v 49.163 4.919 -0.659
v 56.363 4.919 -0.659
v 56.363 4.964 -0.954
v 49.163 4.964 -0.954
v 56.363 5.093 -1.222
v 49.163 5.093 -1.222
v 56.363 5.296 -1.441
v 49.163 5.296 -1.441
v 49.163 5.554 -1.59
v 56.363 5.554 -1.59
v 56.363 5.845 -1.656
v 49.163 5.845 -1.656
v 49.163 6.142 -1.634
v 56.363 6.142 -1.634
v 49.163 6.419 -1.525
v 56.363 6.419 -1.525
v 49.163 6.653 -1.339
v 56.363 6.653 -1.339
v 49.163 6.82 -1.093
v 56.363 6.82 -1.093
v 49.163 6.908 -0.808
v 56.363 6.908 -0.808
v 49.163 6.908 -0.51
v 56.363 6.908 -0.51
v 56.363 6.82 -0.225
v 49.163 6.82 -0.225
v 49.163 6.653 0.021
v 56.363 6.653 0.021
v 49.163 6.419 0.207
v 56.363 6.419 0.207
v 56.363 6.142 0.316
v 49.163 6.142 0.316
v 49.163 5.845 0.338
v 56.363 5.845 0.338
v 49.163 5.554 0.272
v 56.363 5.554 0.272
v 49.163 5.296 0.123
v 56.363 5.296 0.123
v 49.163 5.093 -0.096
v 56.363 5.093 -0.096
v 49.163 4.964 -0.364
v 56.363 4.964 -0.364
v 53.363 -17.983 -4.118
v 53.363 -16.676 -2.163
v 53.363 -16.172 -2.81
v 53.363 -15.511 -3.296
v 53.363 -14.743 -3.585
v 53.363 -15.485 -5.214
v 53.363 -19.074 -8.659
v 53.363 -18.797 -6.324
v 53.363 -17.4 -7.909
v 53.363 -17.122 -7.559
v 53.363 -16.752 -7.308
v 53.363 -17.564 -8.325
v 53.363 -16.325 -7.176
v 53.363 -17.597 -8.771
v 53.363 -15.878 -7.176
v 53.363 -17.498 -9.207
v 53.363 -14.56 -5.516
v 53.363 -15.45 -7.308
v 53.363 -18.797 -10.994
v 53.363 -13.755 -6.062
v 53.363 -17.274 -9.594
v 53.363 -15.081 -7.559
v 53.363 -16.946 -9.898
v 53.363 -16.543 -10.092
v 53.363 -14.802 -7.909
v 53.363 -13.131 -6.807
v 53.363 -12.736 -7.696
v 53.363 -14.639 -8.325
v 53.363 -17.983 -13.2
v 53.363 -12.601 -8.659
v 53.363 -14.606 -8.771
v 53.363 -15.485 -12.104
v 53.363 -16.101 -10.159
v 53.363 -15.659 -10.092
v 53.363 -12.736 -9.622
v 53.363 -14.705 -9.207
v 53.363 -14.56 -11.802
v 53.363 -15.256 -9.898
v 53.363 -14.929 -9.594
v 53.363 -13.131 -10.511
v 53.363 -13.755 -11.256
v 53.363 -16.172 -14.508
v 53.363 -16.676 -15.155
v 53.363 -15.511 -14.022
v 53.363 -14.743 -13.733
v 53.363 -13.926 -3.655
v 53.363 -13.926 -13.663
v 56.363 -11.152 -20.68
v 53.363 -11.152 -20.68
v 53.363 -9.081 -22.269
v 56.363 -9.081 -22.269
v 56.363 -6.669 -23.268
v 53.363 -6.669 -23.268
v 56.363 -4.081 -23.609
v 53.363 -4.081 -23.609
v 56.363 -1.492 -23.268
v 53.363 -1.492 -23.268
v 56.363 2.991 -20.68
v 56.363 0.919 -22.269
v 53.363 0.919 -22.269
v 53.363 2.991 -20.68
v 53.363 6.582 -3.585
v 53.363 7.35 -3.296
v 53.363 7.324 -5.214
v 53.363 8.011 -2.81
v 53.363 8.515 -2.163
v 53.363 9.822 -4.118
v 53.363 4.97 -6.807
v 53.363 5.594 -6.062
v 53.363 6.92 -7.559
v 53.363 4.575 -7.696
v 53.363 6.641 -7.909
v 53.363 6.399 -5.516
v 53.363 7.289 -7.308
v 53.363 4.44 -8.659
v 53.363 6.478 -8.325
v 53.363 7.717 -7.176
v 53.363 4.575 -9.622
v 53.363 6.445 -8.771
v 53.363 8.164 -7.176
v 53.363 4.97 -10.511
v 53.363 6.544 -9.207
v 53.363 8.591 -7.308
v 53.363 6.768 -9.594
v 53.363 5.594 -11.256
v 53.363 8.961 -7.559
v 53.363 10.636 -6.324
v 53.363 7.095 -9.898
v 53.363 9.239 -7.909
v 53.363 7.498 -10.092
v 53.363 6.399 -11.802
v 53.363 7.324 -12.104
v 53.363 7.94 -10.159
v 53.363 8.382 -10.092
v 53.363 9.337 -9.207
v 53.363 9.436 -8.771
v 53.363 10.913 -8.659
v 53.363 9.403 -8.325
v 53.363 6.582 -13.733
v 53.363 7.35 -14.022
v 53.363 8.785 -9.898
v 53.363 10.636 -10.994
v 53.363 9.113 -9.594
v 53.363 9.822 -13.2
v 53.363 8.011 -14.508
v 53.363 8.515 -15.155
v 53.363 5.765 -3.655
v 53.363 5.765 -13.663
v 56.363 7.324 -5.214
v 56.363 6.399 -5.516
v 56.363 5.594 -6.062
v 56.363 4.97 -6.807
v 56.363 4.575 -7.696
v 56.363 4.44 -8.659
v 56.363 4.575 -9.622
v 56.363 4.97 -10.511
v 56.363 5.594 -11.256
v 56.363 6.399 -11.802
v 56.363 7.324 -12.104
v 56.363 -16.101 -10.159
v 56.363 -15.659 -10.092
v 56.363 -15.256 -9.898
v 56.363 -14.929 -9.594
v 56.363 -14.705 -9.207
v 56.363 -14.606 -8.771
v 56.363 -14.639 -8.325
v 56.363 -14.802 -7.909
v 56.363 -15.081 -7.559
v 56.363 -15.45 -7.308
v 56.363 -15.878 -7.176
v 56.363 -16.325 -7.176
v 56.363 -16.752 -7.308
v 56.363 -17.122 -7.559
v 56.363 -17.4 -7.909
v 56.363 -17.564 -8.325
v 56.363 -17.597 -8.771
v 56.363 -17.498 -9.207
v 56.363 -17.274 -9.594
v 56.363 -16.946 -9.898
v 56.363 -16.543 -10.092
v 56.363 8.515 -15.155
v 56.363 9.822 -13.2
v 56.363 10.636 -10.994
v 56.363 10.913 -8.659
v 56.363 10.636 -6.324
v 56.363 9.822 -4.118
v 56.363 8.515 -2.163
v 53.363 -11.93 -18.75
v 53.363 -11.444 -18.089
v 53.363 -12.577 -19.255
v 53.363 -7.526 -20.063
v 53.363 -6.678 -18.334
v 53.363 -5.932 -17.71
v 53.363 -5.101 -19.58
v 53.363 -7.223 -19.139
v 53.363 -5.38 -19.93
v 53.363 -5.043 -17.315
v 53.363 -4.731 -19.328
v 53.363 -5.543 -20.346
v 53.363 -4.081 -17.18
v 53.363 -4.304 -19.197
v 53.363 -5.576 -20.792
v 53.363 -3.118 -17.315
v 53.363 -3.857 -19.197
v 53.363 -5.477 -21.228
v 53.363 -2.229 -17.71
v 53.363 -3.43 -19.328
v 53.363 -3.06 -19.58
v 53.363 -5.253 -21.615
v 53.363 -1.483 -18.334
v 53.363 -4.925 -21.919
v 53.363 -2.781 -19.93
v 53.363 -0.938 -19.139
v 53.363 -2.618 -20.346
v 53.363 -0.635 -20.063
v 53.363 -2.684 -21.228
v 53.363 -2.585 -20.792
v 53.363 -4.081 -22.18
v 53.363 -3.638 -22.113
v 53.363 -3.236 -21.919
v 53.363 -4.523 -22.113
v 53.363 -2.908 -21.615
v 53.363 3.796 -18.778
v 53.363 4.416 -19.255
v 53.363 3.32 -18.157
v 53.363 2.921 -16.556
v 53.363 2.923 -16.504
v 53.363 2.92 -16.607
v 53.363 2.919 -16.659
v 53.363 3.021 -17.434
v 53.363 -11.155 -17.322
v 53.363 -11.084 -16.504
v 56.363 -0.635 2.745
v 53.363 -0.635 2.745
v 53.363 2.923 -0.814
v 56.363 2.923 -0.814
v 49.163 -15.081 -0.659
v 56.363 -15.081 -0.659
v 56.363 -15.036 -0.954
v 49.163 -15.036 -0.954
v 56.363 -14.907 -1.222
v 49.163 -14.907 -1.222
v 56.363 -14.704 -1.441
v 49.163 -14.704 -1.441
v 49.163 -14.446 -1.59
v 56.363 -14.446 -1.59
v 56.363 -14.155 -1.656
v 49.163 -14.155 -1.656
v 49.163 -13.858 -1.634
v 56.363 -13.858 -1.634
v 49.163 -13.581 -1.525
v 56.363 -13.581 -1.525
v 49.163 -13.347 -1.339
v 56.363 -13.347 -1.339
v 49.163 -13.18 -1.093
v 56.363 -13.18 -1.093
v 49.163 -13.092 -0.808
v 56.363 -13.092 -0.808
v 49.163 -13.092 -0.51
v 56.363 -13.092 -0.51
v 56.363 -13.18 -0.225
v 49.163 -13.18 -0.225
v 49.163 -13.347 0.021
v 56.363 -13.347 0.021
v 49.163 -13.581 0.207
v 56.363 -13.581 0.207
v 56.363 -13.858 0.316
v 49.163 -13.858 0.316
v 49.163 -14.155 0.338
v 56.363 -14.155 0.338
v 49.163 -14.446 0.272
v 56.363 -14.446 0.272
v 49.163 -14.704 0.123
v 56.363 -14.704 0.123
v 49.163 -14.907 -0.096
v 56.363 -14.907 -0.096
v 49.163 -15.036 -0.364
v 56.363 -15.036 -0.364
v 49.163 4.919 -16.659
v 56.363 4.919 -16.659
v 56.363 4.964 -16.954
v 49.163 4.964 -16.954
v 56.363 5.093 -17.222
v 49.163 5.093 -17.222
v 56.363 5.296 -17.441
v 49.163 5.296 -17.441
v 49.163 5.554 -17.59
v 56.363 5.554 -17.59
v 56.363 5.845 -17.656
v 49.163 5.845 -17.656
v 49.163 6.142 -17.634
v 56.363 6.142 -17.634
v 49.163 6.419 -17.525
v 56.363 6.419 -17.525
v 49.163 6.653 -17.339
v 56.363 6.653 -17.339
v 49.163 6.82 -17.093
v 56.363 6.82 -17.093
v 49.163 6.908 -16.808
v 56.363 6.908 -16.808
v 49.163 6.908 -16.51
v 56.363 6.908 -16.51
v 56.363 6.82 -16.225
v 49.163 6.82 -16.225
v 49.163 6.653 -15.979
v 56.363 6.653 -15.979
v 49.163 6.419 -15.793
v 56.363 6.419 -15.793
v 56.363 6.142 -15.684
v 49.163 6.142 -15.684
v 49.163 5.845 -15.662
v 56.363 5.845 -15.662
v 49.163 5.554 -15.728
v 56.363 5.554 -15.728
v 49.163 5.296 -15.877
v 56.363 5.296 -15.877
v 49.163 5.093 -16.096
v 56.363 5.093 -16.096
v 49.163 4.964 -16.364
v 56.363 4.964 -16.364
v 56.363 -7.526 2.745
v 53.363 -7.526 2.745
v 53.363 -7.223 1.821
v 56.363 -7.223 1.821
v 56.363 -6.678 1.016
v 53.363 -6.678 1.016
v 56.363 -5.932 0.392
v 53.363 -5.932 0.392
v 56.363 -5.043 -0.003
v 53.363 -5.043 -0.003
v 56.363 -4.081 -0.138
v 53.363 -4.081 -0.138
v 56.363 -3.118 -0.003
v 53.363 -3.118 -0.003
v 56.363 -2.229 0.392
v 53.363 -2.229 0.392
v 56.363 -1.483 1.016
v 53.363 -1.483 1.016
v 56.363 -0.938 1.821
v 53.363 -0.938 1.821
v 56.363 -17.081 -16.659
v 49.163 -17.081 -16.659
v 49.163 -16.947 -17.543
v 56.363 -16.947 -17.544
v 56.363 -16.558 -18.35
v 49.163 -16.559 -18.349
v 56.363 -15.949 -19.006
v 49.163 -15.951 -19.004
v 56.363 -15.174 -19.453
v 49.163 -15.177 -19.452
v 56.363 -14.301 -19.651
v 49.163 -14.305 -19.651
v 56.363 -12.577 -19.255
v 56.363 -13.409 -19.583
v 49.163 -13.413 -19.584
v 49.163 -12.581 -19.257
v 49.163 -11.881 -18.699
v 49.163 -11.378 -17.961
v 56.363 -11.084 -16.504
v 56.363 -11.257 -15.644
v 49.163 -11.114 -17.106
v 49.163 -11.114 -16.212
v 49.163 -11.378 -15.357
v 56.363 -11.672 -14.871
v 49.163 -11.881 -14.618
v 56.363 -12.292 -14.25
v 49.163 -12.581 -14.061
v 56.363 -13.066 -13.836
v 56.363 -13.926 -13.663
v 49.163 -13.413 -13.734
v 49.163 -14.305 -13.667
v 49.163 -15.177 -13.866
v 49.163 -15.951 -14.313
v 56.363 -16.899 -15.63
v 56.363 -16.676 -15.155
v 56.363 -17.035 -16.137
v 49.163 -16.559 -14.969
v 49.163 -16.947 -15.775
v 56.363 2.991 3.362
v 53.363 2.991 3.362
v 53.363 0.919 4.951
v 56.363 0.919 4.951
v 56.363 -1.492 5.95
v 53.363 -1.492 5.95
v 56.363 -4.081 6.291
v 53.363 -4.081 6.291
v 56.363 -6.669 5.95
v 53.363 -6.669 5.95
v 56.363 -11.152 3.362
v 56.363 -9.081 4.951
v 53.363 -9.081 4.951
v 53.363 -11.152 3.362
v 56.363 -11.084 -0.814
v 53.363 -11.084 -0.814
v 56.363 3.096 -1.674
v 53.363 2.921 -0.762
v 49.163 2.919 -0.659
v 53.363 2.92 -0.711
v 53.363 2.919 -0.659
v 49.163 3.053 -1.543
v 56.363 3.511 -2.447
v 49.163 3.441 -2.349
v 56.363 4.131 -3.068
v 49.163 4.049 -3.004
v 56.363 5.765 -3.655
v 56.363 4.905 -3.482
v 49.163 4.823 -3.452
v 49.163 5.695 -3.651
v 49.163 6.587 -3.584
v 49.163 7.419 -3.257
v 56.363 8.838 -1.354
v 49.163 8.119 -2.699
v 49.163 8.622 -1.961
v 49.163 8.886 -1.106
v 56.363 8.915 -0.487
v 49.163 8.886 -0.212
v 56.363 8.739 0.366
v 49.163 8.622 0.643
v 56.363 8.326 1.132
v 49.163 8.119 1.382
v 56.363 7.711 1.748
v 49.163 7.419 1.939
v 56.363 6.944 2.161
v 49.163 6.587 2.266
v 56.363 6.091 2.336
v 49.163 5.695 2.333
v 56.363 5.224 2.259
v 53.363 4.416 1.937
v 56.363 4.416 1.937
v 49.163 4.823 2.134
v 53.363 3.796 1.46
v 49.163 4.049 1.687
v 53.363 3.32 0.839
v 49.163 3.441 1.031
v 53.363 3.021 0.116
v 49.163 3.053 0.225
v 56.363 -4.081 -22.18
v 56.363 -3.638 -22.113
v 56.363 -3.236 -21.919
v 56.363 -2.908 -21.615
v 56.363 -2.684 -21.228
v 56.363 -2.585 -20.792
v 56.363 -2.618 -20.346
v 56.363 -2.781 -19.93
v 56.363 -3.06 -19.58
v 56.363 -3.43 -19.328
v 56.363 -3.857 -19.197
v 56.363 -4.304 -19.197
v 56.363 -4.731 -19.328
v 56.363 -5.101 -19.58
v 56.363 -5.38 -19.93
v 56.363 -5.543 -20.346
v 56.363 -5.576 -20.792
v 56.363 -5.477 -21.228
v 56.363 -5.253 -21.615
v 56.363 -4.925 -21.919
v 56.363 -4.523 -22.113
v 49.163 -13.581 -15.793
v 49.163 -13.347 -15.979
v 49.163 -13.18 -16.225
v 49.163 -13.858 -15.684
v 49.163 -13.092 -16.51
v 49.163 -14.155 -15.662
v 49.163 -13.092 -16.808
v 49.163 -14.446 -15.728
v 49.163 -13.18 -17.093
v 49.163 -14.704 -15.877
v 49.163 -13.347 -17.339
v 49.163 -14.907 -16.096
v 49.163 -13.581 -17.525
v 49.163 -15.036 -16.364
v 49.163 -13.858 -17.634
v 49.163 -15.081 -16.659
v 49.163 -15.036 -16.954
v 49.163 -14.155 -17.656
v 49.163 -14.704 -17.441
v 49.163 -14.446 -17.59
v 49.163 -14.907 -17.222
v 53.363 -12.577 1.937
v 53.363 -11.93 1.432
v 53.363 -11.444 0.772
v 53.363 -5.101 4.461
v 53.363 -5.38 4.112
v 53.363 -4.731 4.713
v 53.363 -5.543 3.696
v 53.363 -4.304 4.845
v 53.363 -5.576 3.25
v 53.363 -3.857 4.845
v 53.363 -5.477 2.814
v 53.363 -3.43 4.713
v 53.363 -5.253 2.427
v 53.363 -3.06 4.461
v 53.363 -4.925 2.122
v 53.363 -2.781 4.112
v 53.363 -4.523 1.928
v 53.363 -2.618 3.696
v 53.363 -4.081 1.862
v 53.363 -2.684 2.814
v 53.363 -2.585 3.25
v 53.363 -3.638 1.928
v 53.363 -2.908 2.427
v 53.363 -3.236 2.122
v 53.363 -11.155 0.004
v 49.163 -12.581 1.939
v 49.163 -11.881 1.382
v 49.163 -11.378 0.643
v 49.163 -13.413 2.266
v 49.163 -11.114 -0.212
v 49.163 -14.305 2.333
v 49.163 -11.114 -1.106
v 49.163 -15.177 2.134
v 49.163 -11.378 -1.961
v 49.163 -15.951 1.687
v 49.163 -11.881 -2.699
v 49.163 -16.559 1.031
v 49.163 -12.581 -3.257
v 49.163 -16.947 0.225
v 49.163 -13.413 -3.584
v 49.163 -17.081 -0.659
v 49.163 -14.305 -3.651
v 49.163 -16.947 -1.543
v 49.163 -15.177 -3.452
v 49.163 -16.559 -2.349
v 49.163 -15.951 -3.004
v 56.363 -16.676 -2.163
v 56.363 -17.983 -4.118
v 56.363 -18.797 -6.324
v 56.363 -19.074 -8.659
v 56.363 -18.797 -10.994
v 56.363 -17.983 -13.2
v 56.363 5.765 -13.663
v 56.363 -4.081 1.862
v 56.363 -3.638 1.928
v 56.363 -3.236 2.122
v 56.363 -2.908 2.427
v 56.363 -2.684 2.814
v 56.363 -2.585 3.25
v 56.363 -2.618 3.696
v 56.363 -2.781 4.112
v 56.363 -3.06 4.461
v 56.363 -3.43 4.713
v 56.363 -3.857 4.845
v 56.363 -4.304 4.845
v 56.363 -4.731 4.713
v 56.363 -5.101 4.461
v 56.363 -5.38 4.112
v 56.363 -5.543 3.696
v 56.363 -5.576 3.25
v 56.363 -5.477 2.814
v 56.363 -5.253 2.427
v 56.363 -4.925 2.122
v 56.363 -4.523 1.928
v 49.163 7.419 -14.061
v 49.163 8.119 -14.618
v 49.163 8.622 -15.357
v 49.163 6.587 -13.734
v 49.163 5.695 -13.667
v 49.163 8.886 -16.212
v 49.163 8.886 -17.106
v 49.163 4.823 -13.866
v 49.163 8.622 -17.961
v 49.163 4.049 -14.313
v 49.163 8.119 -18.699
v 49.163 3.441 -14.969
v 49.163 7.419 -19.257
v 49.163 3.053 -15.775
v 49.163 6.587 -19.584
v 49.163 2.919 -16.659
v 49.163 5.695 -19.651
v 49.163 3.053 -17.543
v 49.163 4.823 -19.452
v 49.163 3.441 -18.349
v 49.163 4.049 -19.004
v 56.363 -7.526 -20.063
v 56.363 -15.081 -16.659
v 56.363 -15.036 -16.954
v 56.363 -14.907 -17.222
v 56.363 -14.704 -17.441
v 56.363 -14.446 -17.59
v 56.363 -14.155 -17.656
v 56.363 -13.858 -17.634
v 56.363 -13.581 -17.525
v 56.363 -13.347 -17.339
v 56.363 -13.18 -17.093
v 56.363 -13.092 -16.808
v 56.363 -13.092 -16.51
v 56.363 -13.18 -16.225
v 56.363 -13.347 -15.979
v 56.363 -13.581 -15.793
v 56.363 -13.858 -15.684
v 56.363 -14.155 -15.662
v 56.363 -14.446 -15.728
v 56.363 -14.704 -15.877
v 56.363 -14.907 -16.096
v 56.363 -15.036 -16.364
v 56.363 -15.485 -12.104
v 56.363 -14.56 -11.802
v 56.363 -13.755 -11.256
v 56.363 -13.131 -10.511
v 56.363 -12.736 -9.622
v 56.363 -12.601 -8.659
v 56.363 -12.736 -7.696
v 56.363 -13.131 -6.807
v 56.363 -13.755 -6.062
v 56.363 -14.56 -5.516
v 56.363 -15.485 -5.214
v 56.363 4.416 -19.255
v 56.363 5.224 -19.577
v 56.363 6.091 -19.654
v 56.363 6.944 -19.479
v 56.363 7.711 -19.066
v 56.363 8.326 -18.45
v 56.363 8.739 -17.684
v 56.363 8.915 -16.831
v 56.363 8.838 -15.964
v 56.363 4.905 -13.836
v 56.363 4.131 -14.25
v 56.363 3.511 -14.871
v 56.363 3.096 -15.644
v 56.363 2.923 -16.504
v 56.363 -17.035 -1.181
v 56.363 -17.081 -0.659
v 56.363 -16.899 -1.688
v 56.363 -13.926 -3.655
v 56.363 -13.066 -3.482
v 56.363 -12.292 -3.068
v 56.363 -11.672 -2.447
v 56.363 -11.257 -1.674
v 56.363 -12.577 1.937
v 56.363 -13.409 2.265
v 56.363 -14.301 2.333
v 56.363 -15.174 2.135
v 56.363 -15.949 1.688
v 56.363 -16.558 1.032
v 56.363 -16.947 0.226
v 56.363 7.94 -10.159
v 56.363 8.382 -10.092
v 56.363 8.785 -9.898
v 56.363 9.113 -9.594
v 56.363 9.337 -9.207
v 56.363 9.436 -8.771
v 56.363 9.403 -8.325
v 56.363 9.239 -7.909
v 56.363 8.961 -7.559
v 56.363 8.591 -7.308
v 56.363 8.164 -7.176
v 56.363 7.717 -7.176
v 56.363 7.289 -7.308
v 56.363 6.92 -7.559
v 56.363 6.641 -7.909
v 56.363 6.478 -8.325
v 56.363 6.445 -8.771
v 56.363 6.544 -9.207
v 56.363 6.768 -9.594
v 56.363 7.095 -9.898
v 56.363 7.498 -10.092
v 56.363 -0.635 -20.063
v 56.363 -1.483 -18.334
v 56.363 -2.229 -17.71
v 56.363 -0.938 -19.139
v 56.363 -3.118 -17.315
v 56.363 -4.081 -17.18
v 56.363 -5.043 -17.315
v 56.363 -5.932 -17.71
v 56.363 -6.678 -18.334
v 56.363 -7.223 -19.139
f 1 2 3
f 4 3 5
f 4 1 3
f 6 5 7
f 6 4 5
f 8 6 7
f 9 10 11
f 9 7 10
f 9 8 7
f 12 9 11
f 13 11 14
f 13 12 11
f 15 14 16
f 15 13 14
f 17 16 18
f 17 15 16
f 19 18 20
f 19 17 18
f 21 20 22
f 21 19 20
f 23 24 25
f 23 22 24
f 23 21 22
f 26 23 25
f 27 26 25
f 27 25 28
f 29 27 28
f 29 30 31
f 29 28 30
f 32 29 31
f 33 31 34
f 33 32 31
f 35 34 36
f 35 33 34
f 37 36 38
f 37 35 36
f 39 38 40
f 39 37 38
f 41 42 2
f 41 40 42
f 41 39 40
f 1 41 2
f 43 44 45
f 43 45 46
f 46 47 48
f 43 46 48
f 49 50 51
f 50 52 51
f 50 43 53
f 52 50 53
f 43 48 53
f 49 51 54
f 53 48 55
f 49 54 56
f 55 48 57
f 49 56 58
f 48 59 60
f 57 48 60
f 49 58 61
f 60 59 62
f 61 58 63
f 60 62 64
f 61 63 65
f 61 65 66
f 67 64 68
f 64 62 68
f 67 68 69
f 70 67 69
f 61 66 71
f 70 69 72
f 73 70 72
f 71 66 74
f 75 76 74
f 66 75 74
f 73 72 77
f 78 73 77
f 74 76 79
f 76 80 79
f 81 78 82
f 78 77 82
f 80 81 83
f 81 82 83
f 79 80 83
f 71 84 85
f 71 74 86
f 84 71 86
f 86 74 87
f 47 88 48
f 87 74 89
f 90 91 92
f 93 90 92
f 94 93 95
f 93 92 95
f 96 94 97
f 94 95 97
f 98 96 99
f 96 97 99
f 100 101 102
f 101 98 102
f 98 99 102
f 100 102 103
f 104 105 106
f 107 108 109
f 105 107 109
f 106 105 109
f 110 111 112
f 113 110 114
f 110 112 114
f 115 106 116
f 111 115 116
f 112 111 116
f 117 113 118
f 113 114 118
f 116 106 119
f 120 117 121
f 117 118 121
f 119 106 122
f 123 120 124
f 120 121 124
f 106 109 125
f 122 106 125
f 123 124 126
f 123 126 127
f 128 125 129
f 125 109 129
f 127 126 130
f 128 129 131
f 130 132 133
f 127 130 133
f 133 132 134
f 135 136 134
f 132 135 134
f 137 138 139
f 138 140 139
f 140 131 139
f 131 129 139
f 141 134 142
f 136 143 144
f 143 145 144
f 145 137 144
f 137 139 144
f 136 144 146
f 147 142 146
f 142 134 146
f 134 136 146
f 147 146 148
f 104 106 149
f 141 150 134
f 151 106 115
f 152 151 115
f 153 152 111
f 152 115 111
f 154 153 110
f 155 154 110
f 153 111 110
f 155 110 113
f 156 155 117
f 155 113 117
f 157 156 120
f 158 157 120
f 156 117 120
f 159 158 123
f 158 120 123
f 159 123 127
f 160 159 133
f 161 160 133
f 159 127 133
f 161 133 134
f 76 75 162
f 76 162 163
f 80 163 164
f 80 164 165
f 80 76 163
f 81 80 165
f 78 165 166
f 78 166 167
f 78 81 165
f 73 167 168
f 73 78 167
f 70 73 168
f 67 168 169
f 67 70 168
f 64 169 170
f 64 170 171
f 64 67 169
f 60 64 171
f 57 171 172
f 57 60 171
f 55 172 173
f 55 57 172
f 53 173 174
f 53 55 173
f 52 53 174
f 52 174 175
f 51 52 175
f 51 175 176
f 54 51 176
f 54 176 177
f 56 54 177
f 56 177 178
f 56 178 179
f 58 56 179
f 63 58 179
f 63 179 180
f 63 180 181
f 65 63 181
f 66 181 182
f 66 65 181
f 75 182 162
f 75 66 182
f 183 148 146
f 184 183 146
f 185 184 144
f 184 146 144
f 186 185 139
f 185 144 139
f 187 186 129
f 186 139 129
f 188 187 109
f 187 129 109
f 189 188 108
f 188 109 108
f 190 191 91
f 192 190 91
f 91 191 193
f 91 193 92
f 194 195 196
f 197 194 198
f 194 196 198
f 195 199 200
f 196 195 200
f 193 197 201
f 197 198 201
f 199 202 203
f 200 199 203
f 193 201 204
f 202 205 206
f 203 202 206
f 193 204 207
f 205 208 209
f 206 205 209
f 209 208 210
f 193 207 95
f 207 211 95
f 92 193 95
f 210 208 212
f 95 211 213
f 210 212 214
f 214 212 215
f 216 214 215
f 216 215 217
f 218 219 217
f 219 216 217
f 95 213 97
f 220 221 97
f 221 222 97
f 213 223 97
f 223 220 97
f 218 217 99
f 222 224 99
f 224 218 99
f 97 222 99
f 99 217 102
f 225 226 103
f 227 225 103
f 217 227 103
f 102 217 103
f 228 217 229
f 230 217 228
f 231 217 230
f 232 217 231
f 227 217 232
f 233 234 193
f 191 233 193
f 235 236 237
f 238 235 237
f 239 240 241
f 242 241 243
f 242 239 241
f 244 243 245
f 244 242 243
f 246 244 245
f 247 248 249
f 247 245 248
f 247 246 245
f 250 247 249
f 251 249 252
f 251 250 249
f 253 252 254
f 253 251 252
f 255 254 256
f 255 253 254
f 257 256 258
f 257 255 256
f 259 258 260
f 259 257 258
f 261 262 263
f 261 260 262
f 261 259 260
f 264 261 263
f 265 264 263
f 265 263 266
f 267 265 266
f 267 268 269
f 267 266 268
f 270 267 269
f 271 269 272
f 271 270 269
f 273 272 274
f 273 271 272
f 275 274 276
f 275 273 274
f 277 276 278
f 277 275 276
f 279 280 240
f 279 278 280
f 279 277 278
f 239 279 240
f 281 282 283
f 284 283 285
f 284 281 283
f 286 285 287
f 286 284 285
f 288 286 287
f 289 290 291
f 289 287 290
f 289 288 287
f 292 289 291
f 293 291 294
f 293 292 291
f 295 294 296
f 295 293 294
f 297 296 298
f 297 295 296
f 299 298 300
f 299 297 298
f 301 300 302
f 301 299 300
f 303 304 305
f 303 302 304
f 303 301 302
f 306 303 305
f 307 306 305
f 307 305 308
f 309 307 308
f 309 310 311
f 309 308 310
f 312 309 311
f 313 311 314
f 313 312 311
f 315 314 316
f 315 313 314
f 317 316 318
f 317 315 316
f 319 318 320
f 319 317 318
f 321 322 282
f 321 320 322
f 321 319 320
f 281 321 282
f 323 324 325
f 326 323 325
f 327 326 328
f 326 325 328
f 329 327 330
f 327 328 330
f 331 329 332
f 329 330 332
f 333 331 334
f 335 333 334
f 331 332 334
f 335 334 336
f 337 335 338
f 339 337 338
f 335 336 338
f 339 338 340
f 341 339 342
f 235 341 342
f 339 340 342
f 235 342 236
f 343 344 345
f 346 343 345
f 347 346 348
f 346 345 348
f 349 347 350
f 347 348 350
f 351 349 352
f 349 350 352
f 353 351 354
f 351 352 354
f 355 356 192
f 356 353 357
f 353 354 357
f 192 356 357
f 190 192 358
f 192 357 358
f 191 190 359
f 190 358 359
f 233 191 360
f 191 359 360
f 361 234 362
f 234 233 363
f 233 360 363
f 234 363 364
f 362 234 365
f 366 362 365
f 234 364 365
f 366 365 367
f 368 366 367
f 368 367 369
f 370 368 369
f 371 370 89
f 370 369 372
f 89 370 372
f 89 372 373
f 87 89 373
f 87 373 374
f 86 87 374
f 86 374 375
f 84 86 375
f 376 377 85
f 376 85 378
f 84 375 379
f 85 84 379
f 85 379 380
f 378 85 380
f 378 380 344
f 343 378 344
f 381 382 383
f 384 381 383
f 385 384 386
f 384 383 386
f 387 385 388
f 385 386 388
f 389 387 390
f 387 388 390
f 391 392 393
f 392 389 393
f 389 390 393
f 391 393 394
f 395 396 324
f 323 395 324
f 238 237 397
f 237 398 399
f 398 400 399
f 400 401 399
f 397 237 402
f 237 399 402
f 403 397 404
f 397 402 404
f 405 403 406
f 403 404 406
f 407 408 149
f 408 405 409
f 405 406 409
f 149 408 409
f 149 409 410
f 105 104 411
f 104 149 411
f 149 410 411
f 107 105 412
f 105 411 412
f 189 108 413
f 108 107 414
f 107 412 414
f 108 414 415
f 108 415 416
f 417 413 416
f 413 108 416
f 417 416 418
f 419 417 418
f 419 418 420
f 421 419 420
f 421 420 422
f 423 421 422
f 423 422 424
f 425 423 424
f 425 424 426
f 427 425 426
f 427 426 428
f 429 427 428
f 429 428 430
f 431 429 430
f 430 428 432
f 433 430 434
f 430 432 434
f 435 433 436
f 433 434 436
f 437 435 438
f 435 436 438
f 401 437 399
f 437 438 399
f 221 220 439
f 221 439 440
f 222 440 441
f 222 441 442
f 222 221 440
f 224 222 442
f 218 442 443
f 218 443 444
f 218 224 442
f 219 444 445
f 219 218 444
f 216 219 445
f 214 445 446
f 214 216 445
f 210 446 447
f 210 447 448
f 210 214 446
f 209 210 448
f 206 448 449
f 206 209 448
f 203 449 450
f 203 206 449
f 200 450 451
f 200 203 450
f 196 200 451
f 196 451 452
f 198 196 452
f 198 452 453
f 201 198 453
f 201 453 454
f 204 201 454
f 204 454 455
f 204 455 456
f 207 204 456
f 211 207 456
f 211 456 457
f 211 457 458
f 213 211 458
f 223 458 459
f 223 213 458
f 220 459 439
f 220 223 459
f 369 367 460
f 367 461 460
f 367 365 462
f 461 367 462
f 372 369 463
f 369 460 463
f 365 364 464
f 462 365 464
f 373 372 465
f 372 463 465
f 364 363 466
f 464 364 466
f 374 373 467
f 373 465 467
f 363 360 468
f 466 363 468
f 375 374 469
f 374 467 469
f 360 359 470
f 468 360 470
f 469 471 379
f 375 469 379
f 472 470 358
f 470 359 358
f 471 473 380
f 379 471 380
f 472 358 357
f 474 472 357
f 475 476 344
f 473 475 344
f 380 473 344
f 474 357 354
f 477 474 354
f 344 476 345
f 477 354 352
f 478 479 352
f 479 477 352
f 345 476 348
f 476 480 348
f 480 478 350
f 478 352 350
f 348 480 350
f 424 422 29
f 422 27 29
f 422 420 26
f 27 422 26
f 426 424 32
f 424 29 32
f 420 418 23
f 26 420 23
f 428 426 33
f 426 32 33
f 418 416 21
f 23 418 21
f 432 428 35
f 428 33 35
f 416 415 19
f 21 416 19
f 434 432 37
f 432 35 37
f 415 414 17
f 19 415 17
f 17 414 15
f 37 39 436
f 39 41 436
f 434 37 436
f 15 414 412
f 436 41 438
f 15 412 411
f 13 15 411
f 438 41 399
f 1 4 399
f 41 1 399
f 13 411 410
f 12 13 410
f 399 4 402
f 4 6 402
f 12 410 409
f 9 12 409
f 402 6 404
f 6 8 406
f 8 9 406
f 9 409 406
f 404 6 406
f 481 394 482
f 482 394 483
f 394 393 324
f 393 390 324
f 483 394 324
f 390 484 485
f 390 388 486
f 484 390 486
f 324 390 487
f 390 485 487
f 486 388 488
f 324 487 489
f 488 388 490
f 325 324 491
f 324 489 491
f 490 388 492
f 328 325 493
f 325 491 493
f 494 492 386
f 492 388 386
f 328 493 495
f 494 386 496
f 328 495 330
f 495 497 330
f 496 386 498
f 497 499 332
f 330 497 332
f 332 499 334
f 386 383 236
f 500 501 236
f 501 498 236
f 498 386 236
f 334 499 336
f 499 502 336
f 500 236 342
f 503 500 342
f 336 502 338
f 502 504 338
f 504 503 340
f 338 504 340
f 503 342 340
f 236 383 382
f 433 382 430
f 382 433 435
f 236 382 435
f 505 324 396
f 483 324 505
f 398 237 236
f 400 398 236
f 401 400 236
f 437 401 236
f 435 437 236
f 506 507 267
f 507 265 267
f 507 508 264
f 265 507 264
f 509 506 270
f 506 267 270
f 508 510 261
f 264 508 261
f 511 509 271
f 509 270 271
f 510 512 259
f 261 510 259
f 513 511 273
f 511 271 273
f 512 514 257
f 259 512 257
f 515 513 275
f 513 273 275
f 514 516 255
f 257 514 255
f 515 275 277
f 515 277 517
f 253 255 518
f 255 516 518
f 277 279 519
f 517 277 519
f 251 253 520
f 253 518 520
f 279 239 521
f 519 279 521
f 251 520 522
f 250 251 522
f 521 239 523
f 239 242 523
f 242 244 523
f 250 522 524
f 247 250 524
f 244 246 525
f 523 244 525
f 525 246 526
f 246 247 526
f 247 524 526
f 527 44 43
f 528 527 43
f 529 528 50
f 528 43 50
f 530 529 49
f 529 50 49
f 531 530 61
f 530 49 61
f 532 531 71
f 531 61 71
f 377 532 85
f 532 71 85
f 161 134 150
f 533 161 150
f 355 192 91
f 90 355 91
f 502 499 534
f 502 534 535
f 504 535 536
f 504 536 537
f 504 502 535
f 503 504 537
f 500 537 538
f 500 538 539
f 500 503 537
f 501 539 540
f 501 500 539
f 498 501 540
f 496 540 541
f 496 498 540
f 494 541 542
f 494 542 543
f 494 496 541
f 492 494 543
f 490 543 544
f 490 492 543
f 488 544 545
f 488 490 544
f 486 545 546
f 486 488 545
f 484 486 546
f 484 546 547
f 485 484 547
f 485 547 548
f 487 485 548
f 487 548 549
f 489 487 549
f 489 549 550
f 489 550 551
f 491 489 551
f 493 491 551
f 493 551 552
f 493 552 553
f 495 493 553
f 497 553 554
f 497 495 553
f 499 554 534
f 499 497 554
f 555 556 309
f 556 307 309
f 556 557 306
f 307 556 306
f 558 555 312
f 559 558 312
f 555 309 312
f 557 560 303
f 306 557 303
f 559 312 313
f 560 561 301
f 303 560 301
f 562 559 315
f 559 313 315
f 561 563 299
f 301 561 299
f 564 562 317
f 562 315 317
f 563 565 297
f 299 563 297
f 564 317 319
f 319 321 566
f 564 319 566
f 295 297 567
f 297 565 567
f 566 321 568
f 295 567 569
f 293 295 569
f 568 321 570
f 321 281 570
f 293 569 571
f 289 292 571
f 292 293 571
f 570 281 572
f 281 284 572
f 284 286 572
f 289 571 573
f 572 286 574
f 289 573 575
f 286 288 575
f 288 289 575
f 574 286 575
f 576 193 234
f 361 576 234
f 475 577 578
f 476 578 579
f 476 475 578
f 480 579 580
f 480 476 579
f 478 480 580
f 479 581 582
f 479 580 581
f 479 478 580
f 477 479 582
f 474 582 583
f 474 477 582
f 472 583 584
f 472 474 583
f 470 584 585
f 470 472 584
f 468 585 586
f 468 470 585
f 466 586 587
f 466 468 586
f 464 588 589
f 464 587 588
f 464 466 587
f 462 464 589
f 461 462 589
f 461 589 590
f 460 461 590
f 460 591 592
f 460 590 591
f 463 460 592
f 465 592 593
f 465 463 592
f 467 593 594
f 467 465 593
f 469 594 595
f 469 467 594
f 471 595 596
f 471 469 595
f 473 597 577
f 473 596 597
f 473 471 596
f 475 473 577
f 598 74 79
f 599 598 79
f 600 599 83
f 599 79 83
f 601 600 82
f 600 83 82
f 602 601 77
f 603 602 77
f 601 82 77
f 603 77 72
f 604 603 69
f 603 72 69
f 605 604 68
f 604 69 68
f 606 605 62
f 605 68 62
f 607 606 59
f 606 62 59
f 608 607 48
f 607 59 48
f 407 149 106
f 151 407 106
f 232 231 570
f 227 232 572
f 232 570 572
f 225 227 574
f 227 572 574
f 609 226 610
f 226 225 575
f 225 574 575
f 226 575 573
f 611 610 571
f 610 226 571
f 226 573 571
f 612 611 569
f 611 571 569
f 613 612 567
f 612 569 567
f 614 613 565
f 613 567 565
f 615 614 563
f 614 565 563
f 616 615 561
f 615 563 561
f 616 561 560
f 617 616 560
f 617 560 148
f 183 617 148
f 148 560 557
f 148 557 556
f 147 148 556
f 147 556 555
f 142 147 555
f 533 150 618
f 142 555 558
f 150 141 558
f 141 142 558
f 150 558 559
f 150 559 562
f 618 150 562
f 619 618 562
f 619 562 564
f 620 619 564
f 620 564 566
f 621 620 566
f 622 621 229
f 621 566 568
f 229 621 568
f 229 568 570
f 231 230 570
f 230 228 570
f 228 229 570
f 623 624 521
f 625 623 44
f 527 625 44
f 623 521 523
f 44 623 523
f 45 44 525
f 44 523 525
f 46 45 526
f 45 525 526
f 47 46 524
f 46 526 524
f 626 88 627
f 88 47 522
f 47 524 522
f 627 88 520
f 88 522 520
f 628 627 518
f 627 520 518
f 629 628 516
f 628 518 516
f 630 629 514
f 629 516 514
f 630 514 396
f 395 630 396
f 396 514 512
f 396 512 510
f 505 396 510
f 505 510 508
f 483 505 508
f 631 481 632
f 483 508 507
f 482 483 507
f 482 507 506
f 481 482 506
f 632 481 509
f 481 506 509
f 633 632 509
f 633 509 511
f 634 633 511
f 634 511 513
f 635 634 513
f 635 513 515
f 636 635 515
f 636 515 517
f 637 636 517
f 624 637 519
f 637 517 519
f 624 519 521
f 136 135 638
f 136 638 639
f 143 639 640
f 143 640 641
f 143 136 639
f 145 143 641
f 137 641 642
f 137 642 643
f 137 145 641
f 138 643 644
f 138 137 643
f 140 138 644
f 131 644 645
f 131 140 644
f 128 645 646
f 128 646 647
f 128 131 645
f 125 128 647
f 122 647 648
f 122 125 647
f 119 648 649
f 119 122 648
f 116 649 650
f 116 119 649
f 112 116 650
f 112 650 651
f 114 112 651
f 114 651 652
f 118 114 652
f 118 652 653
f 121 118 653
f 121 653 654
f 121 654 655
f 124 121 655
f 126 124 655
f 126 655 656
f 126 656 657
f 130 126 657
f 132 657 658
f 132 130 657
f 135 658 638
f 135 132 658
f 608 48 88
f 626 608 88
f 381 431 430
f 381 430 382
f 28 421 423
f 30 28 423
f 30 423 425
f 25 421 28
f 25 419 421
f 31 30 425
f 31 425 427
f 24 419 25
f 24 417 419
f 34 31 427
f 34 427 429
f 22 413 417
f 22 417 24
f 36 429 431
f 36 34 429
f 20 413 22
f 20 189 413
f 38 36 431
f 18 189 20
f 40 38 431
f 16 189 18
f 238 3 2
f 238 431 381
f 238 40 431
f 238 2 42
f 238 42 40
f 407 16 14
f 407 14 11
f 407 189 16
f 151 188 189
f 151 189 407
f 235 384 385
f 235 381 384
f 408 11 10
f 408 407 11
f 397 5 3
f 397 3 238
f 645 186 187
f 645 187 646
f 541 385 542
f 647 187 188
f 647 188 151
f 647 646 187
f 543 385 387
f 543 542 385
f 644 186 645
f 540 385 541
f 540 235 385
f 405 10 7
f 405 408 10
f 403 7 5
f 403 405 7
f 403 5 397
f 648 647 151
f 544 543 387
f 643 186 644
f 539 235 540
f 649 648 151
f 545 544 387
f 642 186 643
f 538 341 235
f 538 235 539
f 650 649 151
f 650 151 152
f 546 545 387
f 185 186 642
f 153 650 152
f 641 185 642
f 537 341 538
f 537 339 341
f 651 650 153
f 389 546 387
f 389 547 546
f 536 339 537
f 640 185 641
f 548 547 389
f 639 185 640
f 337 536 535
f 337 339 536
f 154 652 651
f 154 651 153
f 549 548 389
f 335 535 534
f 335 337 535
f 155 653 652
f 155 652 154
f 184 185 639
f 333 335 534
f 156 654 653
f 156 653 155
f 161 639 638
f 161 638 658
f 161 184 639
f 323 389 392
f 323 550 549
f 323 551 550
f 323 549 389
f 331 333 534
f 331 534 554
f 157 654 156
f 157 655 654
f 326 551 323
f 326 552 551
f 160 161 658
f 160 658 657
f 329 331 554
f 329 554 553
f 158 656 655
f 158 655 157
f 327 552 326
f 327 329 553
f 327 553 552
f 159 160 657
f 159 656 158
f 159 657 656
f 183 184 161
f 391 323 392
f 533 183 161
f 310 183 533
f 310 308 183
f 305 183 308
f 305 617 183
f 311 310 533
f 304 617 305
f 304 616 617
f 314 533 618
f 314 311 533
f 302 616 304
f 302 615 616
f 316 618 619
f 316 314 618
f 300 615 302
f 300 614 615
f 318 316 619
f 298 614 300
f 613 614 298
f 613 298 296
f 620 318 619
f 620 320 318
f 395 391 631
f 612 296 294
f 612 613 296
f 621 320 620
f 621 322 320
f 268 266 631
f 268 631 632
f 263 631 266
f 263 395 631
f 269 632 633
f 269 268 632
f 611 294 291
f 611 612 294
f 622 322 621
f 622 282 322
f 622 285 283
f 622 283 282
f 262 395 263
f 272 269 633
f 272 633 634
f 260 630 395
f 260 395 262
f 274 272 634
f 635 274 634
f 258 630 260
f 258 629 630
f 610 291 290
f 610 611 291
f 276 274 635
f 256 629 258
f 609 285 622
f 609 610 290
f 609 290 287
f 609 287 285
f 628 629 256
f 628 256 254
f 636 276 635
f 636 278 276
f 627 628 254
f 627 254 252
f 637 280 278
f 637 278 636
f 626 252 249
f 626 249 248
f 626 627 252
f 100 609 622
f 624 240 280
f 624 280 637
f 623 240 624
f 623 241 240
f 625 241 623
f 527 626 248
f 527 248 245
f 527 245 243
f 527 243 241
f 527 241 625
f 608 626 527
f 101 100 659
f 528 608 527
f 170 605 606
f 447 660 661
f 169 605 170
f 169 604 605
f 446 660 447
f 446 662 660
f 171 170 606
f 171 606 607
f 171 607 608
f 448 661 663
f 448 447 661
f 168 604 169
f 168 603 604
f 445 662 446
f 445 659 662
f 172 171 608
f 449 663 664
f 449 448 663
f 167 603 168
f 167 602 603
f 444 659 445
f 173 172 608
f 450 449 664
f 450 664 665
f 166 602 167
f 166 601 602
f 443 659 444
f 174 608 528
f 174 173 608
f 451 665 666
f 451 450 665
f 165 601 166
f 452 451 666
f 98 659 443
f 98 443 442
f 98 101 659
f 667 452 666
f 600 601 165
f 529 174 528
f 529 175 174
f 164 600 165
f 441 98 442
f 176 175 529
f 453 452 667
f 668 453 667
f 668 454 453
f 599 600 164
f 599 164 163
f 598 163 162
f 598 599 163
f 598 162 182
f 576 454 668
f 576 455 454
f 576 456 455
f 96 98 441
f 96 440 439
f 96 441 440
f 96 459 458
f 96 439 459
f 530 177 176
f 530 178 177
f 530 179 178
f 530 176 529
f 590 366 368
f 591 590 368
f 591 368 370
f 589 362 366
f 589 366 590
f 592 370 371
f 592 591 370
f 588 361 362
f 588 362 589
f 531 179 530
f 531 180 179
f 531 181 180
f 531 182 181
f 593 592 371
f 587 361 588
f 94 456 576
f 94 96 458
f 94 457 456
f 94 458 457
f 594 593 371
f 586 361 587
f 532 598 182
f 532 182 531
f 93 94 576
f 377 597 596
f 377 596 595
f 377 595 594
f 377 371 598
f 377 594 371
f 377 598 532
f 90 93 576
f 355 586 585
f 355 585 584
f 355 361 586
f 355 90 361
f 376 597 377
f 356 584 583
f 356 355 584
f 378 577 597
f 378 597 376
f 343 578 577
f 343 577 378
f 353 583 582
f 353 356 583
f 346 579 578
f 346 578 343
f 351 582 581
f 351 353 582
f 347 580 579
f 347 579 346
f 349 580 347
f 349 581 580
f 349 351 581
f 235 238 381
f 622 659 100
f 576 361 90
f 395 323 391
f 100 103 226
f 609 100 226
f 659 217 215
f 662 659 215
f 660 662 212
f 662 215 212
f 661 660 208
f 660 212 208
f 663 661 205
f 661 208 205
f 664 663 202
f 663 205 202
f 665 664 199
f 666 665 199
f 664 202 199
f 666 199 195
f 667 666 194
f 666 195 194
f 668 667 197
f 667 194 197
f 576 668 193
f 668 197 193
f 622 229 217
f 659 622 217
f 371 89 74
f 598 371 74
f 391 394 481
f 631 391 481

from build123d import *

# Parameters (mm, degrees)
SKETCH1_R             = 3
SKETCH1_R_2           = 1
BOSS_EXTRUDE1_DEPTH   = 7.2
BOSS_EXTRUDE1_2_DEPTH = 7.2
BOSS_EXTRUDE1_3_DEPTH = 7.2
BOSS_EXTRUDE1_4_DEPTH = 7.2
BOSS_EXTRUDE2_START   = -3
SKETCH2_R             = 1.5
BOSS_EXTRUDE2_DEPTH   = 3
FILLET1_R             = 10


with BuildPart() as part:
    # Sketch1 → Boss-Extrude1 (new body)
    with BuildSketch(Plane(origin=(49.162852783, 0, 0), x_dir=(0, 0, -1), z_dir=(1, 0, 0))):
        with Locations(Location((0.658959109, 5.919497669, 0), (0, 0, 270))):
            Circle(SKETCH1_R)
        with Locations(Location((0.658959109, 5.919497669, 0), (0, 0, 270))):
            Circle(SKETCH1_R_2, mode=Mode.SUBTRACT)
    extrude(amount=BOSS_EXTRUDE1_DEPTH)



with BuildPart() as body_2:
    # Sketch1 → Boss-Extrude1 2 (new body)
    with BuildSketch(Plane(origin=(49.162852783, 0, 0), x_dir=(0, 0, -1), z_dir=(1, 0, 0))):
        with Locations(Location((0.658959109, -14.080502331, 0), (0, 0, 270))):
            Circle(SKETCH1_R)
        with Locations(Location((0.658959109, -14.080502331, 0), (0, 0, 270))):
            Circle(SKETCH1_R_2, mode=Mode.SUBTRACT)
    extrude(amount=BOSS_EXTRUDE1_2_DEPTH)


with BuildPart() as body_3:
    # Sketch1 → Boss-Extrude1 3 (new body)
    with BuildSketch(Plane(origin=(49.162852783, 0, 0), x_dir=(0, 0, -1), z_dir=(1, 0, 0))):
        with Locations(Location((16.658959109, -14.080502331, 0), (0, 0, 270))):
            Circle(SKETCH1_R)
        with Locations(Location((16.658959109, -14.080502331, 0), (0, 0, 270))):
            Circle(SKETCH1_R_2, mode=Mode.SUBTRACT)
    extrude(amount=BOSS_EXTRUDE1_3_DEPTH)


with BuildPart() as body_4:
    # Sketch1 → Boss-Extrude1 4 (new body)
    with BuildSketch(Plane(origin=(49.162852783, 0, 0), x_dir=(0, 0, -1), z_dir=(1, 0, 0))):
        with Locations(Location((16.658959109, 5.919497669, 0), (0, 0, 270))):
            Circle(SKETCH1_R)
        with Locations(Location((16.658959109, 5.919497669, 0), (0, 0, 270))):
            Circle(SKETCH1_R_2, mode=Mode.SUBTRACT)
    extrude(amount=BOSS_EXTRUDE1_4_DEPTH)


with BuildPart() as part_1:
    add(part.part)

    add(body_2.part)  # Boss-Extrude2 merges body 2

    add(body_3.part)  # Boss-Extrude2 merges body 3

    add(body_4.part)  # Boss-Extrude2 merges body 4
    # Sketch2 → Boss-Extrude2 (add)
    with BuildSketch(Plane(origin=(56.362852783, 0, 0), x_dir=(0, 0, -1), z_dir=(1, 0, 0)).offset(BOSS_EXTRUDE2_START)):
        with BuildLine():
            Line((-0.336368494, 6.016053158), (-10.432923983, -4.080502331))
            Line((-10.432923983, -4.080502331), (-0.336368494, -14.17705782))
            ThreePointArc((-0.336368494, -14.17705782), (1.366065891, -13.373395549), (0.562403621, -15.075829934))
            Line((0.562403621, -15.075829934), (8.658959109, -23.172385423))
            Line((8.658959109, -23.172385423), (16.755514598, -15.075829934))
            ThreePointArc((16.755514598, -15.075829934), (15.951852328, -13.373395549), (17.654286713, -14.17705782))
            Line((17.654286713, -14.17705782), (27.750842202, -4.080502331))
            Line((27.750842202, -4.080502331), (17.654286713, 6.016053158))
            ThreePointArc((17.654286713, 6.016053158), (15.951852328, 5.212390888), (16.755514598, 6.914825272))
            Line((16.755514598, 6.914825272), (8.658959109, 15.011380761))
            Line((8.658959109, 15.011380761), (0.562403621, 6.914825272))
            ThreePointArc((0.562403621, 6.914825272), (1.366065891, 5.212390888), (-0.336368494, 6.016053158))
        make_face()
        with Locations((-3.361856171, -4.080502331)):
            Circle(SKETCH2_R, mode=Mode.SUBTRACT)
        with BuildLine():
            ThreePointArc((-2.745060132, -7.525725494), (0.138143829, -4.080502331), (-2.745060132, -0.635279167))
            Line((-2.745060132, -0.635279167), (5.213735946, 7.323516911))
            ThreePointArc((5.213735946, 7.323516911), (8.658959109, 4.440312949), (12.104182273, 7.323516911))
            Line((12.104182273, 7.323516911), (20.062978351, -0.635279167))
            ThreePointArc((20.062978351, -0.635279167), (17.17977439, -4.080502331), (20.062978351, -7.525725494))
            Line((20.062978351, -7.525725494), (12.104182273, -15.484521572))
            ThreePointArc((12.104182273, -15.484521572), (8.658959109, -12.601317611), (5.213735946, -15.484521572))
            Line((5.213735946, -15.484521572), (-2.745060132, -7.525725494))
        make_face(mode=Mode.SUBTRACT)
        with Locations((8.658959109, -16.101317611)):
            Circle(SKETCH2_R, mode=Mode.SUBTRACT)
        with Locations((20.67977439, -4.080502331)):
            Circle(SKETCH2_R, mode=Mode.SUBTRACT)
        with Locations((8.658959109, 7.940312949)):
            Circle(SKETCH2_R, mode=Mode.SUBTRACT)
    extrude(amount=BOSS_EXTRUDE2_DEPTH)

    # Fillet1
    # the kernel refuses this fillet: 10 mm, written as the material it takes off along each edge
    with BuildSketch(Plane(origin=(30.395755029, 15.011380761, -8.658959109), x_dir=(0, -0.7071067811865511, -0.7071067811865438), z_dir=(1, 0, 0)), Plane(origin=(30.395755029, -23.172385423, -8.658959109), x_dir=(0, 0.7071067811865509, 0.707106781186544), z_dir=(1, 0, 0))) as fillet1_piece_1:
        with BuildLine():
            CenterArc((9.969337782, -9.969337782), FILLET1_R, 94.487975167, 81.024049665)
            Line((0, -9.186839102), (0, 0))
            Line((0, 0), (9.186839102, 0))
        make_face()
    extrude(amount=48.934195508, mode=Mode.SUBTRACT)
    with BuildSketch(Plane(origin=(28.362852783, -4.080502331, -27.750842202), x_dir=(-4.937700262164531e-15, -0.7071067811865436, 0.7071067811865513), z_dir=(1, 0, 0))) as fillet1_piece_2:
        with BuildLine():
            CenterArc((FILLET1_R, -FILLET1_R), FILLET1_R, 90, 90)
            Line((0, -FILLET1_R), (0, 0))
            Line((0, 0), (FILLET1_R, 0))
        make_face()
    extrude(amount=53, mode=Mode.SUBTRACT)
    with BuildSketch(Plane(origin=(28.362852783, -4.080502331, 10.432923983), x_dir=(0, -0.7071067811865515, -0.7071067811865436), z_dir=(1, 0, 0))) as fillet1_piece_3:
        with BuildLine():
            CenterArc((FILLET1_R, FILLET1_R), FILLET1_R, 180, 90)
            Line((0, FILLET1_R), (0, 0))
            Line((0, 0), (FILLET1_R, 0))
        make_face()
    extrude(amount=53, mode=Mode.SUBTRACT)


solid = part_1.part
